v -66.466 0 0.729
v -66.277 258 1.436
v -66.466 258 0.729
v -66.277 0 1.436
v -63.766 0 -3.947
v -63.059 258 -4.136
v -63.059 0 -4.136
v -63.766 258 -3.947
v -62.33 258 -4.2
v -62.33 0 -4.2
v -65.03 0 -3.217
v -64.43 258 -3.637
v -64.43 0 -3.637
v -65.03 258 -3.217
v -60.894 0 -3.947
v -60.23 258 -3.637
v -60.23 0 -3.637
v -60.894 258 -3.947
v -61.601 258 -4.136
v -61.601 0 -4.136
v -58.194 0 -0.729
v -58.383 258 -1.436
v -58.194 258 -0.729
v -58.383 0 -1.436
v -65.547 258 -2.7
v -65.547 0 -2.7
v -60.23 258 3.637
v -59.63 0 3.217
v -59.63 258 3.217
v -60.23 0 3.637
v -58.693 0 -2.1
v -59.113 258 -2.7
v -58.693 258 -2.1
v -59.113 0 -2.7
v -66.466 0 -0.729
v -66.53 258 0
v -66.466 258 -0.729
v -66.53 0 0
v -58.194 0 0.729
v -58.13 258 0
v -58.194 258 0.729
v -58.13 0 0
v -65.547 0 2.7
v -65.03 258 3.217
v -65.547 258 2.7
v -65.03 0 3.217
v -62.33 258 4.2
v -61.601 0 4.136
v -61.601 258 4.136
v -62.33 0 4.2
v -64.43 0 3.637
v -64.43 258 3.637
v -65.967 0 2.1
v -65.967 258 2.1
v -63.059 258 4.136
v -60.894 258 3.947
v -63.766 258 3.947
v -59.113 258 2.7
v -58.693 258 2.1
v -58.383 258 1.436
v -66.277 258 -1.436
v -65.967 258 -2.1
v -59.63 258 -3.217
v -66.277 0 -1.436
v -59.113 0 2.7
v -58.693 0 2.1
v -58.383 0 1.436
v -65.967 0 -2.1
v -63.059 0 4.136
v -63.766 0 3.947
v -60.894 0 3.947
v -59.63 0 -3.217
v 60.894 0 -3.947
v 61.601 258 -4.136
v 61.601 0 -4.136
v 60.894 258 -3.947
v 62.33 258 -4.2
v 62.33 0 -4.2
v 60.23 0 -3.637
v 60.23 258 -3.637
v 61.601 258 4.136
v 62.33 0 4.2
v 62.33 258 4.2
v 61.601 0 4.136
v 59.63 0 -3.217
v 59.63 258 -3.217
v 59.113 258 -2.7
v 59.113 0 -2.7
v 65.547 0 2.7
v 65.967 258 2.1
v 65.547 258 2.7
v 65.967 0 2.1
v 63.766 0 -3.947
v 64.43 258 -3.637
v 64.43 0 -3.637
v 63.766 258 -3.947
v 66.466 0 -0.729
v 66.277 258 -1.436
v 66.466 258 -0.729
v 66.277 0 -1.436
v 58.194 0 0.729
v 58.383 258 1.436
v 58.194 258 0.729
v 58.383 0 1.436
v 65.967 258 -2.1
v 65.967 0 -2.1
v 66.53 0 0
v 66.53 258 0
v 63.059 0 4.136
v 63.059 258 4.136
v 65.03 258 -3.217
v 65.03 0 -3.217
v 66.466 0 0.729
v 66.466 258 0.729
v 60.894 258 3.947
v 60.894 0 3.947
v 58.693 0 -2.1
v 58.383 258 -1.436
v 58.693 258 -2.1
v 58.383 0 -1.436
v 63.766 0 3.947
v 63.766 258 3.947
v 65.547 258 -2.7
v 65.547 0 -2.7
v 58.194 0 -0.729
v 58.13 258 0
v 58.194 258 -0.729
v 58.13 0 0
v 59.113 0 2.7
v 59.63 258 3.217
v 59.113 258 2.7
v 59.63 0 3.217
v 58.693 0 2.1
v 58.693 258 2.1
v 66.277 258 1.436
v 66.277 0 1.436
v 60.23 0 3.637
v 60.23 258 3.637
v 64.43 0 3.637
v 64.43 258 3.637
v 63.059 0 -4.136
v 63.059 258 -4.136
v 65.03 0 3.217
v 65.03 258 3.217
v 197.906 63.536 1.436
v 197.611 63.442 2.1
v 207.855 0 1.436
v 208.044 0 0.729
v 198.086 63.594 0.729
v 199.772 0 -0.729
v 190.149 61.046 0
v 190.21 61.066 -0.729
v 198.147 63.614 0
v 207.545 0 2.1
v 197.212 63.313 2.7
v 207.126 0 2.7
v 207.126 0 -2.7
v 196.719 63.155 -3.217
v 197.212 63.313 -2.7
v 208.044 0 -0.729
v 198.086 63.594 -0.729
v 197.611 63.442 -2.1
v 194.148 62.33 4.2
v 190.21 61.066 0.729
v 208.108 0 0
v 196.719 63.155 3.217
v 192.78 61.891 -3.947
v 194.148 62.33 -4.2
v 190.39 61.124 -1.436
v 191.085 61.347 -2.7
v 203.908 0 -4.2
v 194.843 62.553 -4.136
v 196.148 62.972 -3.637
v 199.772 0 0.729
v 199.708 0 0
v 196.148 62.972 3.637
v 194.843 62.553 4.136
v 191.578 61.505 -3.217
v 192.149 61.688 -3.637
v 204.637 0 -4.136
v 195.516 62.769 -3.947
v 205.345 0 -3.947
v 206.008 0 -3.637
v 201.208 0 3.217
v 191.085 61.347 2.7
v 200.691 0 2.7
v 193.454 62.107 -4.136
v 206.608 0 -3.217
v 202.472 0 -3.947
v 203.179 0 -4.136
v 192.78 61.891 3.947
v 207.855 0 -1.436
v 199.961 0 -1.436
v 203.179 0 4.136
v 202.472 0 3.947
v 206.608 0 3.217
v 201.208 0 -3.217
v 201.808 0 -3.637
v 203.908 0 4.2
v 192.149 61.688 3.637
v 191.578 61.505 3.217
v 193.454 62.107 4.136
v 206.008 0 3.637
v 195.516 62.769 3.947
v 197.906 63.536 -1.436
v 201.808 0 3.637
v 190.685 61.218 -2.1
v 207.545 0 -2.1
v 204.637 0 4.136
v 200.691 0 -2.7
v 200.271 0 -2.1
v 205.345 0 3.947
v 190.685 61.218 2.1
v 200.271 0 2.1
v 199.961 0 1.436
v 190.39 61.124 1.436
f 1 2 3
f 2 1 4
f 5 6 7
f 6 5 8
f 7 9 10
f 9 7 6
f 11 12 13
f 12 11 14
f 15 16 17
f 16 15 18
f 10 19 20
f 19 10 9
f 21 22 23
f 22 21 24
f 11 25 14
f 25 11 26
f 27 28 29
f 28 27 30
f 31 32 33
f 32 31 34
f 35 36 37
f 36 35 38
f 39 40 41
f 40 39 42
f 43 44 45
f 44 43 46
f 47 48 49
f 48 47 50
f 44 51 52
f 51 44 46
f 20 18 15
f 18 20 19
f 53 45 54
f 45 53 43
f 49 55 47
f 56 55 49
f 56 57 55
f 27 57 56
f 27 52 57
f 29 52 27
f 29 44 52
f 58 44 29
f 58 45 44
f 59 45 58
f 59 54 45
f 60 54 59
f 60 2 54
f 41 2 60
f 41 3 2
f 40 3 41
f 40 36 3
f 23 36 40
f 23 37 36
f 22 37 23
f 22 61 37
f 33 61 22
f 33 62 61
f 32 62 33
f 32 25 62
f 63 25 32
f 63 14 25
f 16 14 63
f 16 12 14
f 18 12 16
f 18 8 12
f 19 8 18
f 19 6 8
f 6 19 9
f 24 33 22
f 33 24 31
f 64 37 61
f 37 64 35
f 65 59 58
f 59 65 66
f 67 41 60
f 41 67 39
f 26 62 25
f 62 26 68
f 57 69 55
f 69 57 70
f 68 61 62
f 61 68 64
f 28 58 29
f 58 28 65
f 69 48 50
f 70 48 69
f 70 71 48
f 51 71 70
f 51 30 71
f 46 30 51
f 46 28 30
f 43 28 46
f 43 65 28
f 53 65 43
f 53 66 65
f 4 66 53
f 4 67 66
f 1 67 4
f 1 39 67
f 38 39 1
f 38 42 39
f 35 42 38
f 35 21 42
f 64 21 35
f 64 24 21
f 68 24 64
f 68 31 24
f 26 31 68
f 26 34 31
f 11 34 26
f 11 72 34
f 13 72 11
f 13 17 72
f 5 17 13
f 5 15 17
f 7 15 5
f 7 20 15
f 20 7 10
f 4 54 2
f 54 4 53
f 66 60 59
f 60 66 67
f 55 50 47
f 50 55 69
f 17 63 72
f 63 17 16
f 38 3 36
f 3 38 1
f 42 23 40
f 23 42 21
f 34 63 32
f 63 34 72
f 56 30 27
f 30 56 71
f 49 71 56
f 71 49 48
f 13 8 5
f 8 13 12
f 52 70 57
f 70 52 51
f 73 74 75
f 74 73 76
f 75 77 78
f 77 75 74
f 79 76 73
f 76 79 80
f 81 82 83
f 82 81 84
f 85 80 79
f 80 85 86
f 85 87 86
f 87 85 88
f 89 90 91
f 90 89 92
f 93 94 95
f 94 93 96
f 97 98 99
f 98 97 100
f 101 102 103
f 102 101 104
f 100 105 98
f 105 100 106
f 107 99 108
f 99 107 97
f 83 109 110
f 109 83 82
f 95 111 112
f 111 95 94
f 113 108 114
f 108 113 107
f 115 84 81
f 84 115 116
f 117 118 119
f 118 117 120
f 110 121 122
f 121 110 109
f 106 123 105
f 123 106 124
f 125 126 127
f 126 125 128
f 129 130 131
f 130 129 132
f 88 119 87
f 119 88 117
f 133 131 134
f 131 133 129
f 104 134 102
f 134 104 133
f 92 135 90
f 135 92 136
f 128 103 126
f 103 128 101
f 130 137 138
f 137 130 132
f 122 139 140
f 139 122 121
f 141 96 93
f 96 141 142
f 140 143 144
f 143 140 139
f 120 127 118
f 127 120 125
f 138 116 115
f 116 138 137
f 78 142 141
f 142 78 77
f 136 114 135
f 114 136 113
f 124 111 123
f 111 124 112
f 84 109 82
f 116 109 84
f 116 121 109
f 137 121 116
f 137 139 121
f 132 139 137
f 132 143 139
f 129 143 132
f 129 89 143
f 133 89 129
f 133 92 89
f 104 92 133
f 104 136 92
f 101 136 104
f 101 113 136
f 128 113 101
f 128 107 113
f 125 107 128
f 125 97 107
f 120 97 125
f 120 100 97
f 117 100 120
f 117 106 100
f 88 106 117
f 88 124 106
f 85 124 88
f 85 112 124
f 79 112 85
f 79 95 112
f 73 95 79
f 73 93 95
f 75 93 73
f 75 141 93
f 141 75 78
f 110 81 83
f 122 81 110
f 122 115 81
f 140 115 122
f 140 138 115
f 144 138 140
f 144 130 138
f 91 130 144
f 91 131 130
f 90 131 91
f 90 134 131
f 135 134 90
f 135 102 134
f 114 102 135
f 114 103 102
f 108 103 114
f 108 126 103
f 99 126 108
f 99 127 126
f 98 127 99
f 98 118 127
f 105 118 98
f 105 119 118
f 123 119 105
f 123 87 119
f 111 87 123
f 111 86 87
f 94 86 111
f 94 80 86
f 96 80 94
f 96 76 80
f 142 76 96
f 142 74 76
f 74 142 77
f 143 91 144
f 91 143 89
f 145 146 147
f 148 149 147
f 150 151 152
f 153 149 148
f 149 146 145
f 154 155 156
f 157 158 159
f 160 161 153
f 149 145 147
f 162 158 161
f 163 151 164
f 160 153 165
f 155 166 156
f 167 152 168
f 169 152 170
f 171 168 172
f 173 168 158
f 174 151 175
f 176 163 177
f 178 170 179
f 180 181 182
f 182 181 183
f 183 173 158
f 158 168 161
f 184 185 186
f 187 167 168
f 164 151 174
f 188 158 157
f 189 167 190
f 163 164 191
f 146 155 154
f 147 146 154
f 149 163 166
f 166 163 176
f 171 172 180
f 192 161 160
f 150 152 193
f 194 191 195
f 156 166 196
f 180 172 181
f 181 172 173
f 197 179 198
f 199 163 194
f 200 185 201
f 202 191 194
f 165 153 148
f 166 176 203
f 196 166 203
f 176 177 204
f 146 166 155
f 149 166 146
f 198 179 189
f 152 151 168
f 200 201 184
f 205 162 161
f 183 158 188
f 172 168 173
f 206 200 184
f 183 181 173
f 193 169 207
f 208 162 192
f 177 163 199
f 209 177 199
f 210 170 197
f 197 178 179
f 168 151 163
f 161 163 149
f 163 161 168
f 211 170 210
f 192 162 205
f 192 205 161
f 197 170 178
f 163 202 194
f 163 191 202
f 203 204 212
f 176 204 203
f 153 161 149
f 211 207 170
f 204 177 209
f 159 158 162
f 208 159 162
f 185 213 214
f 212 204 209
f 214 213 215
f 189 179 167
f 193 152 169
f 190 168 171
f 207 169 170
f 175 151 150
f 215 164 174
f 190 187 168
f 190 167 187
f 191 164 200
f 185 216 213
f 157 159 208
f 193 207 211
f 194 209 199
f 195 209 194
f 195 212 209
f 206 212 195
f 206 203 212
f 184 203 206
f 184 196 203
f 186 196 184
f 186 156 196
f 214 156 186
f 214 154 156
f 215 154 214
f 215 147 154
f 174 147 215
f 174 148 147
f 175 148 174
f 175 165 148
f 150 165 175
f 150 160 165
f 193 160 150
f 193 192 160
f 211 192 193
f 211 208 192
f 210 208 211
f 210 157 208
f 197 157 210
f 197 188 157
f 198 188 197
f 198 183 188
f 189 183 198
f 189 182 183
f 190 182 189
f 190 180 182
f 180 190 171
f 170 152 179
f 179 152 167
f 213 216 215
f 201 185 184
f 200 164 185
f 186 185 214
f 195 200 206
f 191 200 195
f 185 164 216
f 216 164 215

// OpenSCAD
$fn=36;

tubed=8.40;
tubedip=9.76;

innerwidth=116.26;
innerlength=56.10;

centerwidth=innerwidth+tubed;
centerlength=innerlength+tubed;

arcradius=(tubedip/2)+(centerwidth*centerwidth/(8*tubedip));
arccenter=arcradius-tubedip;
arcangle=atan(centerwidth/2/arccenter);

module tube(length){
    rotate([0,90,0]){
        cylinder(d=tubed, h=length);
    }
}

module arc_tube($radius, $angle){
    rotate_extrude(angle=$angle, convexity = 2){
        translate([$radius,0,0]){
            rotate([0,0,0]) circle(d=tubed);
        }
    }
}

translate([-centerwidth/2,0,0]){
   rotate([0,0,90]) tube(centerlength*4);
}
translate([centerwidth/2,0,0]){
   rotate([0,0,90]) tube(centerlength*4);
}

arc_tube(arcradius, arcangle);
